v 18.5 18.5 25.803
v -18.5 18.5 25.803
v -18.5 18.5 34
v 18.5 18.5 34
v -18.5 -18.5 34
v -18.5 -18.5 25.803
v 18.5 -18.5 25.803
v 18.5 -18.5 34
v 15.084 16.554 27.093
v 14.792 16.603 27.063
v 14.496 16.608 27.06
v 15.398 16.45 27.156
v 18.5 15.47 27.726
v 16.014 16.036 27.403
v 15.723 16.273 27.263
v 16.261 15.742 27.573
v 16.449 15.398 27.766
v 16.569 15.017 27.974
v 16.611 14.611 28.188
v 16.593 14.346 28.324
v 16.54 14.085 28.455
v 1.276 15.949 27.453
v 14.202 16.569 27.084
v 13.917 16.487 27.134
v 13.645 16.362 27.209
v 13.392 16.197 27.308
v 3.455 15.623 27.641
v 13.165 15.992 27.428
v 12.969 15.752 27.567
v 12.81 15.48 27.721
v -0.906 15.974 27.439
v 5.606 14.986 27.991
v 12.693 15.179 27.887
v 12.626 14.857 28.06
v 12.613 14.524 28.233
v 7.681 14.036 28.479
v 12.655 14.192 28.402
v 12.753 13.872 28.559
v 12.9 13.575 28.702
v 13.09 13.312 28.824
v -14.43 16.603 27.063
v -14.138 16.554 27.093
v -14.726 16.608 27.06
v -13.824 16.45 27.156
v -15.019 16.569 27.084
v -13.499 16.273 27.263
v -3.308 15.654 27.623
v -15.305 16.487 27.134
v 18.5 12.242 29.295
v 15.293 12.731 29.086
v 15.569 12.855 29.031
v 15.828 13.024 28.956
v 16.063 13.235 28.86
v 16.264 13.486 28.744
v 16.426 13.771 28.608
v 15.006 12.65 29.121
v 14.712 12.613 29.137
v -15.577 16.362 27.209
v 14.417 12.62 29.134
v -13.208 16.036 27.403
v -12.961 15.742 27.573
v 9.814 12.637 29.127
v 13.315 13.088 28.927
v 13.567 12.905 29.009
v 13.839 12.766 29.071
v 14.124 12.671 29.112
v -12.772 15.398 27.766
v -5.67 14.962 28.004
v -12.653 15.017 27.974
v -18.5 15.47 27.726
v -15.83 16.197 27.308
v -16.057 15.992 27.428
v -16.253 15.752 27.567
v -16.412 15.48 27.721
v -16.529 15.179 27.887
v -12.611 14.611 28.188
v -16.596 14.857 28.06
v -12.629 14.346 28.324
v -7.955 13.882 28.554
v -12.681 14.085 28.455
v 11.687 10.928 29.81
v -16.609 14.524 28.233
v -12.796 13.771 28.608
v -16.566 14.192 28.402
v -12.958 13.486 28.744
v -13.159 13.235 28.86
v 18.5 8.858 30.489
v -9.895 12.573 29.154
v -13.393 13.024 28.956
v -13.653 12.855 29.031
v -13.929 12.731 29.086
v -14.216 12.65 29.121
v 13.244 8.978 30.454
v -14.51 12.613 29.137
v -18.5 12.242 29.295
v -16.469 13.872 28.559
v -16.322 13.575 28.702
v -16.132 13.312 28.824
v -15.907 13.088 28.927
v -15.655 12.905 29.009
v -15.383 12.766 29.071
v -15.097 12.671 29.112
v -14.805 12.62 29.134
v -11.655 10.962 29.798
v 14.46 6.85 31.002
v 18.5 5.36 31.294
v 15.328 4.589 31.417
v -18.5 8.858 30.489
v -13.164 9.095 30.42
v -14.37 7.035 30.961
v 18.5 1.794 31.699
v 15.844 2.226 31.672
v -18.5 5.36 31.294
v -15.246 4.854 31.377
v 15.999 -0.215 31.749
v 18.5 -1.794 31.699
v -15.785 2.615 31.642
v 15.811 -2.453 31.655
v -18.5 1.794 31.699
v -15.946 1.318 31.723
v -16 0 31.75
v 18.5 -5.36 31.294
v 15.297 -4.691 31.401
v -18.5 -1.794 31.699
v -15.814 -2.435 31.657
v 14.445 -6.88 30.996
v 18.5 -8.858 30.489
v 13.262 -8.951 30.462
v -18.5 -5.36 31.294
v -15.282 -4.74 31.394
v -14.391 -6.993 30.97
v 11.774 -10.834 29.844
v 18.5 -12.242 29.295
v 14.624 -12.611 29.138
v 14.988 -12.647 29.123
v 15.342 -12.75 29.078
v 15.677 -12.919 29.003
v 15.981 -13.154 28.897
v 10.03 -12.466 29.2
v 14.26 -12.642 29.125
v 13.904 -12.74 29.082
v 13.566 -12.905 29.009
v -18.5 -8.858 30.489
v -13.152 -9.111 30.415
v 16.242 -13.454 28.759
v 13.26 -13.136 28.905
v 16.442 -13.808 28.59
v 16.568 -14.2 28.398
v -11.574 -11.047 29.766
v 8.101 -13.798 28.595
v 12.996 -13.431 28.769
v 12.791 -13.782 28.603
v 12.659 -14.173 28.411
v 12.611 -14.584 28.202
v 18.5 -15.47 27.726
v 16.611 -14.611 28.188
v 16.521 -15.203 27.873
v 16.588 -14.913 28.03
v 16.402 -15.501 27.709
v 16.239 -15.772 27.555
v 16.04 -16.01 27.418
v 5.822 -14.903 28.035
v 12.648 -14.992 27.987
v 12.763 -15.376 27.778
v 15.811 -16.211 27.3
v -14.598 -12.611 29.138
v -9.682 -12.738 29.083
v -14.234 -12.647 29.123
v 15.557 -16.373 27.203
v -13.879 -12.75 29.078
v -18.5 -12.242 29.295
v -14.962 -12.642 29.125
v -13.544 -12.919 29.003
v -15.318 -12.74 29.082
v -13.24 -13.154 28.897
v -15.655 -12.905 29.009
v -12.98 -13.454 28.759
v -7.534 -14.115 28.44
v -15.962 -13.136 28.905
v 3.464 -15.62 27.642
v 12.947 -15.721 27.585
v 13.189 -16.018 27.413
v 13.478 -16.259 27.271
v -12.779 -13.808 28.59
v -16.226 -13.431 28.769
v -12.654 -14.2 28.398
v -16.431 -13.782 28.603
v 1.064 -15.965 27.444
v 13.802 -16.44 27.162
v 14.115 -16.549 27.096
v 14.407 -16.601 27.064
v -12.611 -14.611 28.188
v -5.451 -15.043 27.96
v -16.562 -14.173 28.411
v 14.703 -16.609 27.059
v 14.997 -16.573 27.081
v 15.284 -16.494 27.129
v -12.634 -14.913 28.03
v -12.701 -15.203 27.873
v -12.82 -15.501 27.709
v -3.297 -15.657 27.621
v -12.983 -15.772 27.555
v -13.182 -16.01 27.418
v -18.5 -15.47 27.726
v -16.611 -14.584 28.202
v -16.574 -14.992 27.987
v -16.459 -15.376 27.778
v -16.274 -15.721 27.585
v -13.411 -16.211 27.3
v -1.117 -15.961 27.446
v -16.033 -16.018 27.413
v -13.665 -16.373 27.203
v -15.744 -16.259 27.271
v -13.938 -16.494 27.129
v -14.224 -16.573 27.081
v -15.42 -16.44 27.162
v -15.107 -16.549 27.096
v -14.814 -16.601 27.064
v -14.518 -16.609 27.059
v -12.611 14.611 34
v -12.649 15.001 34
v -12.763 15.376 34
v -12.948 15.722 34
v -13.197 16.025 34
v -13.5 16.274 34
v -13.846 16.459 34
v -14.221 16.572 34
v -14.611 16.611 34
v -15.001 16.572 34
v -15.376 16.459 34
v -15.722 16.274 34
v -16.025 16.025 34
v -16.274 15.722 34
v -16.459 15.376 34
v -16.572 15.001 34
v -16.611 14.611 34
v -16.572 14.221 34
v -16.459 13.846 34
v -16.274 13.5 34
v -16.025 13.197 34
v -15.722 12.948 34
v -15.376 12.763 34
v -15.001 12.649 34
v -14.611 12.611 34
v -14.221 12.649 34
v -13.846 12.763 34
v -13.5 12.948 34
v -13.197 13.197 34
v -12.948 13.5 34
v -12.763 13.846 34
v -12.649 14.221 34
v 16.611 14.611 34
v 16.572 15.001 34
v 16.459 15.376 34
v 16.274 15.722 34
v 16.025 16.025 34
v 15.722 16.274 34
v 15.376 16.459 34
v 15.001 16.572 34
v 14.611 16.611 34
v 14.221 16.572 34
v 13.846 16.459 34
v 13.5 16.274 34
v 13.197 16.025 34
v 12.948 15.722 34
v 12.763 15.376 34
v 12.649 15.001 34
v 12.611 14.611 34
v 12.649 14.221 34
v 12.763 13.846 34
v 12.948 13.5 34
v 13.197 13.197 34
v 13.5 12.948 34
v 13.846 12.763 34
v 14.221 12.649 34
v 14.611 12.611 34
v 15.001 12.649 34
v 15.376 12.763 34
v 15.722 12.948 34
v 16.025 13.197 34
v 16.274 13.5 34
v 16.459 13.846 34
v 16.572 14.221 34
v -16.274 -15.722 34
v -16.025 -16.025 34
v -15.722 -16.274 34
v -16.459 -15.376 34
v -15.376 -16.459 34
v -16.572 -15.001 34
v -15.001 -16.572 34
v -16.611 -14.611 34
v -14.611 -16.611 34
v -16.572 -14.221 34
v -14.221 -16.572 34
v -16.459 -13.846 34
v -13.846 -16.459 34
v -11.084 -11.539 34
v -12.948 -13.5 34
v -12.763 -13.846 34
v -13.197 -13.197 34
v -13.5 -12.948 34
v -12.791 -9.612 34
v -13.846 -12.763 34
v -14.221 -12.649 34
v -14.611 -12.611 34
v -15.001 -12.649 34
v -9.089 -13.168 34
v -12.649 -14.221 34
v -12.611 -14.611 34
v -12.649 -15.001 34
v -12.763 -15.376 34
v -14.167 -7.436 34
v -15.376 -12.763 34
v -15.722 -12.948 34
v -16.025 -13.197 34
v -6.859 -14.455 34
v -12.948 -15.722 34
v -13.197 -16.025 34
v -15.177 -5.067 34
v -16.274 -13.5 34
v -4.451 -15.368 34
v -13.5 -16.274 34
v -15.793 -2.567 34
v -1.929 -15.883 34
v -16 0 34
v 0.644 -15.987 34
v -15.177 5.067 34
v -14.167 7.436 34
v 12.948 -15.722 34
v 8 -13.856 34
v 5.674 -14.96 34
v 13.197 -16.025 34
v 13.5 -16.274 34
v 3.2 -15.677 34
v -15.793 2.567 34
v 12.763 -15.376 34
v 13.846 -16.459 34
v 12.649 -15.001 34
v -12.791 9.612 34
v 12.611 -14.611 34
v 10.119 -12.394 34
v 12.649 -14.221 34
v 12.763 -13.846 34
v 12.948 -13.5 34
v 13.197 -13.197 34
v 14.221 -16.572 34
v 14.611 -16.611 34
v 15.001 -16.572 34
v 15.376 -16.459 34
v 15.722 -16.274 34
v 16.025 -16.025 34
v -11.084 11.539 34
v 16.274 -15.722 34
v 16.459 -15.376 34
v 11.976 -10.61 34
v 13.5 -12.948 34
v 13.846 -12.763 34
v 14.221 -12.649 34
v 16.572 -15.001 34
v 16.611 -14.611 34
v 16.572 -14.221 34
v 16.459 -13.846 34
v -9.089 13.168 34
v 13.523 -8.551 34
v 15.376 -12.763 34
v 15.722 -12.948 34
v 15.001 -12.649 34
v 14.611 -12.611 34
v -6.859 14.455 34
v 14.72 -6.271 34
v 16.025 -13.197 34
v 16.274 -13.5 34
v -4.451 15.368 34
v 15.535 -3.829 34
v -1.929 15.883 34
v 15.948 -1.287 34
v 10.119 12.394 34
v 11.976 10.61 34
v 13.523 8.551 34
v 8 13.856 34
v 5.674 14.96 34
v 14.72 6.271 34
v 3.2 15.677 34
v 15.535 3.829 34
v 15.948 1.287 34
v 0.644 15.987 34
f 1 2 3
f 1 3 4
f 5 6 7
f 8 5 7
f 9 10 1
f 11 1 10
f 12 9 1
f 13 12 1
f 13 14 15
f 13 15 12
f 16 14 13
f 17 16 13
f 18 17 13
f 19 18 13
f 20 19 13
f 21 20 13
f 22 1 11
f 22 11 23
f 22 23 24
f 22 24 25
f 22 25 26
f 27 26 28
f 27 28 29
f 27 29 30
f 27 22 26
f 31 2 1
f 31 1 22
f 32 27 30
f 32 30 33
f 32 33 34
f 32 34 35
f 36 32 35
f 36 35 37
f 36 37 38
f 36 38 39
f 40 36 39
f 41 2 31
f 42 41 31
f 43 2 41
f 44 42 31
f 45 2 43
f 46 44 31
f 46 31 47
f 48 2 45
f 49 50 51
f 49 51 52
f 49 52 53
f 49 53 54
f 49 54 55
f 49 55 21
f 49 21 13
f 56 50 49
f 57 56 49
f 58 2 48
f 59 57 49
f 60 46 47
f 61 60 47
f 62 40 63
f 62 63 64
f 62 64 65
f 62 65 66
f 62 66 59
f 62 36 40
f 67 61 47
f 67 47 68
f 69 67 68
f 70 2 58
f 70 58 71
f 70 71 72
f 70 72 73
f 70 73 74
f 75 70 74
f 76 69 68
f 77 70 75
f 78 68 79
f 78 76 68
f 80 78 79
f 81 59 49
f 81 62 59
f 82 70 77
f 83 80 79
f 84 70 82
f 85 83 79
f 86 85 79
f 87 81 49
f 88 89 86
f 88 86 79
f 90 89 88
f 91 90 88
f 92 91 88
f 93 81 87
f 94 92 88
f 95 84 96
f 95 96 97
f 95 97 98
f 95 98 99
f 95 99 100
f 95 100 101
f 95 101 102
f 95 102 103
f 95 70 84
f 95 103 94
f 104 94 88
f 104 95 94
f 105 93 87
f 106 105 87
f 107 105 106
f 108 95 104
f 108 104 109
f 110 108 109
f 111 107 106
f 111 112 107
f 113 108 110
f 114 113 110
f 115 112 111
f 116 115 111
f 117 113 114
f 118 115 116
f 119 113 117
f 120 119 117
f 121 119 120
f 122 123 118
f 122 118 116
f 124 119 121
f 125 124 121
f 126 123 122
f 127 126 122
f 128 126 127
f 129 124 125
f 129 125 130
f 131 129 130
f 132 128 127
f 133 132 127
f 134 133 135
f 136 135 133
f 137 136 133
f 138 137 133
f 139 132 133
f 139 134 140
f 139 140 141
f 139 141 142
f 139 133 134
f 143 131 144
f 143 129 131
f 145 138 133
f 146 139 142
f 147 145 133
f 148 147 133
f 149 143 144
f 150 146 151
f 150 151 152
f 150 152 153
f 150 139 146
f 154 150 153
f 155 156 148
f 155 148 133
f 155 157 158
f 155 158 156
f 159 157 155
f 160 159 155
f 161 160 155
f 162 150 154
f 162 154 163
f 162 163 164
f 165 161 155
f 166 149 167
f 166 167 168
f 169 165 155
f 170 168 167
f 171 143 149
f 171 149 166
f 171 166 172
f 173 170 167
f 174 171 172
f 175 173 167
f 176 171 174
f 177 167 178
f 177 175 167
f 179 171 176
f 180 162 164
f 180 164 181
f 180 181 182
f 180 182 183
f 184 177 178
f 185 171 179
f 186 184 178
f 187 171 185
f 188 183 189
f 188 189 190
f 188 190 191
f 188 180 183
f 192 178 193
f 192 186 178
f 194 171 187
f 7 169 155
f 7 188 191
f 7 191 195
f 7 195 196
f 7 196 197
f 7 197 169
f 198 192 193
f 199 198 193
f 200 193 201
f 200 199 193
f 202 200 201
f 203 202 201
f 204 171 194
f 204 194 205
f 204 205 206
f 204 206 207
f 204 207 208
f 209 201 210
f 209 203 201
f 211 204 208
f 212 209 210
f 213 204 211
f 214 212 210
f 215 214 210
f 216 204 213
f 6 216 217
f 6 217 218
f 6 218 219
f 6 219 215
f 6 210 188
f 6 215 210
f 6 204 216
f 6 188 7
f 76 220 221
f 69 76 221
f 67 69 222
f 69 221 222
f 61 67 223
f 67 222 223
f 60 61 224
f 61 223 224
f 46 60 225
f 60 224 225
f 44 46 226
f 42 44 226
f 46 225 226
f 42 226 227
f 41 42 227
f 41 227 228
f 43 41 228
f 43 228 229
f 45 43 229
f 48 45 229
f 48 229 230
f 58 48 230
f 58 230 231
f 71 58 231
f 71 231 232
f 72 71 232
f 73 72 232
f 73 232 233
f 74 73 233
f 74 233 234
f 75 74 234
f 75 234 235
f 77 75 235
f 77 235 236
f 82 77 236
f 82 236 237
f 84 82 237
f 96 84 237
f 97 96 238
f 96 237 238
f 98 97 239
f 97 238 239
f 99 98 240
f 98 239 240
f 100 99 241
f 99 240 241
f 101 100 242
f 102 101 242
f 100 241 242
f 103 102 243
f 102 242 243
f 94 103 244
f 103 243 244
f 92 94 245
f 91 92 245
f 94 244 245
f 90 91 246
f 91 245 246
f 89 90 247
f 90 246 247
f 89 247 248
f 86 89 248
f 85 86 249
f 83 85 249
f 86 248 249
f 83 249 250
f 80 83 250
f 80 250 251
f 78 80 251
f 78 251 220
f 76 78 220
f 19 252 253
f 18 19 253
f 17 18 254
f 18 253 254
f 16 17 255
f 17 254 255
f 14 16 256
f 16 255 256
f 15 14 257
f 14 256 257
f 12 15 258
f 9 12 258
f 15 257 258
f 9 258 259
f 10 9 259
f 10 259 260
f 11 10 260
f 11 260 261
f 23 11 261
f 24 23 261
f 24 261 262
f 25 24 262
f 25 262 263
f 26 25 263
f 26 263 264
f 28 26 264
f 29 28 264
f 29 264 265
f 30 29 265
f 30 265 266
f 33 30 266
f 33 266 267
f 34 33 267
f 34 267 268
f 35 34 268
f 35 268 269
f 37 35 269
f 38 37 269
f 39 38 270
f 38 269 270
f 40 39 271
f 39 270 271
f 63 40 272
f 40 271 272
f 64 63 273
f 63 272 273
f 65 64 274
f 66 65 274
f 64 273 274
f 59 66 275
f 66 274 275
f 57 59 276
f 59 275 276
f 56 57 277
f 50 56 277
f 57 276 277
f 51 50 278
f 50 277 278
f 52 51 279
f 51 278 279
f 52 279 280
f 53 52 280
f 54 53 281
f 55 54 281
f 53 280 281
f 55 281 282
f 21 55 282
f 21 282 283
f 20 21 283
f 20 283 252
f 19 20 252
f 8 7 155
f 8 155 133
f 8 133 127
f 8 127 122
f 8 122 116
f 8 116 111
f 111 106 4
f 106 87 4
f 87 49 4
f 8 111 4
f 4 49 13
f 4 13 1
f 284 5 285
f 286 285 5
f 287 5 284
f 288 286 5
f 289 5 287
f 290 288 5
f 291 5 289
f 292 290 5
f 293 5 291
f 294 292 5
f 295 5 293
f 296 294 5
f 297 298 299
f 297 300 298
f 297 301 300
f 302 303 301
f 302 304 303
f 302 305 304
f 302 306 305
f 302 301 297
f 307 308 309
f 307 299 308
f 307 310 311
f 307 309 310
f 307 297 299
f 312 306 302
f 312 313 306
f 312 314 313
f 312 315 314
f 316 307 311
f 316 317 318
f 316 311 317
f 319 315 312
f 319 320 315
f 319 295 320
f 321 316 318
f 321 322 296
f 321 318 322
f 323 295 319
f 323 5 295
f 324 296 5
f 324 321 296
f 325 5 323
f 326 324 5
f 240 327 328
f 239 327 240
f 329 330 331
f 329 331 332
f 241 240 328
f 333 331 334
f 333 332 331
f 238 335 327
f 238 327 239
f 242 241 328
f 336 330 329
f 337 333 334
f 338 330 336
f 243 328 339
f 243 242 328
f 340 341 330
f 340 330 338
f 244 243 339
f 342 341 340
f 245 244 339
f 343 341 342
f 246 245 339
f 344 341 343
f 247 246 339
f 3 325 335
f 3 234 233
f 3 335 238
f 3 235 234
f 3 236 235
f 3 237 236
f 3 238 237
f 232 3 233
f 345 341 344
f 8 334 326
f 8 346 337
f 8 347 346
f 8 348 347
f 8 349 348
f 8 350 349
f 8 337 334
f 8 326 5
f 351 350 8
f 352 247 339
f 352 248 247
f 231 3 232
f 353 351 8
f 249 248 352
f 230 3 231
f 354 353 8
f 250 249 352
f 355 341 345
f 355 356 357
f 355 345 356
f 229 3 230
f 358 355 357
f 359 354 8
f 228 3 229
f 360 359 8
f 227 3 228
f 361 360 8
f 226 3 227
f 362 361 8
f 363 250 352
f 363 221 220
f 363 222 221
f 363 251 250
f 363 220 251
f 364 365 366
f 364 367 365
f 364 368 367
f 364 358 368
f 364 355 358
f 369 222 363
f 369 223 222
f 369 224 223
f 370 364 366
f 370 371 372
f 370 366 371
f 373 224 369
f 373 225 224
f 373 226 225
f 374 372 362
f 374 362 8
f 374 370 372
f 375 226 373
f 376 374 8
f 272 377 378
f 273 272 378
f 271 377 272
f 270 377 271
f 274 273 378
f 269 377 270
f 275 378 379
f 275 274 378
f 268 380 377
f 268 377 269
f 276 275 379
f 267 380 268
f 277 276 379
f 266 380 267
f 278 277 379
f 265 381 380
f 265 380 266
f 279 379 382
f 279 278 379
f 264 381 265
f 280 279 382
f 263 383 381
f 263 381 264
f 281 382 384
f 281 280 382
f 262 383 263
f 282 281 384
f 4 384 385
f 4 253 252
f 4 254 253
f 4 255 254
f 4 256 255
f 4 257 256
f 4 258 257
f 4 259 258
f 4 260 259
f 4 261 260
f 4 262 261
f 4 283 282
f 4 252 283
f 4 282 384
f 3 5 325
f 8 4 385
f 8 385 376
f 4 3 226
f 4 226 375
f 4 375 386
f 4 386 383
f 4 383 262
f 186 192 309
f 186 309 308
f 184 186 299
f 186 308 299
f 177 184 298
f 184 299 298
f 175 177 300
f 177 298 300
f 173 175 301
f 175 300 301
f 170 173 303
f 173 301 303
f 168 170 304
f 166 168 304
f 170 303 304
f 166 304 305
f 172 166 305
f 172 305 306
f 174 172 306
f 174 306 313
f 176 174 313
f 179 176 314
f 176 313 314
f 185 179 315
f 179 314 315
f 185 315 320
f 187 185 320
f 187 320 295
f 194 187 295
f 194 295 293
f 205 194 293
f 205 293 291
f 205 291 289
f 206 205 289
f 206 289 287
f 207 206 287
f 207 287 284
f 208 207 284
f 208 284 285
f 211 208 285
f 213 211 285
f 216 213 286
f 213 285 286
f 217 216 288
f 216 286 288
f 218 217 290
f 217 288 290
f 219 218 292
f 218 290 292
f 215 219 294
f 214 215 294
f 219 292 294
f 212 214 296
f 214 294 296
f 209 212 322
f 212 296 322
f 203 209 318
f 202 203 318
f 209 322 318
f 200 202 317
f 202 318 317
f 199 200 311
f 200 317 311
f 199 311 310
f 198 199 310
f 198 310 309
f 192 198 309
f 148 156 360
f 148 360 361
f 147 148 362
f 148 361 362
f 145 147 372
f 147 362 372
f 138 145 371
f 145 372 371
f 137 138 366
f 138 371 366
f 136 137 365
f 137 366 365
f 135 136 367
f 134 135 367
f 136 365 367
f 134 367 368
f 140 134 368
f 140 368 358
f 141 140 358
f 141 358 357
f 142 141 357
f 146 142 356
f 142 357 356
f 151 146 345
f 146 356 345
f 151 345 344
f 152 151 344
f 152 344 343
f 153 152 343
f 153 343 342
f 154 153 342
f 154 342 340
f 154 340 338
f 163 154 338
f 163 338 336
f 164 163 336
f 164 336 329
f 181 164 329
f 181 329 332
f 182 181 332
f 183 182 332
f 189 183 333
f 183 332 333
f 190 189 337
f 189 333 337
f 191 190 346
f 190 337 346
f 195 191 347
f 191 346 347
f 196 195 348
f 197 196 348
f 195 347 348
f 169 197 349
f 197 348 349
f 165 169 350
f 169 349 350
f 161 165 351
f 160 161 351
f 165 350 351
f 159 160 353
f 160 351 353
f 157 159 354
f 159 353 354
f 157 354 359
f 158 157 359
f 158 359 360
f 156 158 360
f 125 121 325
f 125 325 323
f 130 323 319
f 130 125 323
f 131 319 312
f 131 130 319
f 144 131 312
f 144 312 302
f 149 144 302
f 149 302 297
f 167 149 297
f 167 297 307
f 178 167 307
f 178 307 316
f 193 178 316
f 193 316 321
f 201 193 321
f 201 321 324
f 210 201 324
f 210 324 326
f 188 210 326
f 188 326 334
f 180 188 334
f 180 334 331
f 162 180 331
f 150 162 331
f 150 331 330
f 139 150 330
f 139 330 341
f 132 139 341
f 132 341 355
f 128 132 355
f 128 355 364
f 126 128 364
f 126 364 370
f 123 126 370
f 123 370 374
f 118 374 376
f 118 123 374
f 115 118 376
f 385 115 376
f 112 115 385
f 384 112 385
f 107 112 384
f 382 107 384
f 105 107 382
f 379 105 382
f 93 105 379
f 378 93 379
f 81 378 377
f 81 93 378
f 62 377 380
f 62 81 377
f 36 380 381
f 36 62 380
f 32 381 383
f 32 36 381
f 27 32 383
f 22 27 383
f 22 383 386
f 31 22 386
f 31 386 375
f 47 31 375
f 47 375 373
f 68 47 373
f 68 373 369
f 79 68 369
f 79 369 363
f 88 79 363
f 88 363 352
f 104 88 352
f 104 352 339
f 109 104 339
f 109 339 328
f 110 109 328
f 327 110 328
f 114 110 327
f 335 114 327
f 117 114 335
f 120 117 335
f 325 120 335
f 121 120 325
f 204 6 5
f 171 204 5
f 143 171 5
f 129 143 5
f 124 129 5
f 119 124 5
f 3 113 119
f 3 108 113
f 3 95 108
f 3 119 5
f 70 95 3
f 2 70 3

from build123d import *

# Parameters (mm, degrees)
SKETCH1_W               = 37
SKETCH1_H               = 37
BOSS_EXTRUDE1_DEPTH     = 34
CUT_EXTRUDE1_DEPTH      = 20
CUT_EXTRUDE1_DEPTH_BACK = 20
SKETCH2_R               = 31.75
SKETCH5_R               = 16
CUT_EXTRUDE2_DEPTH      = 43.901048938
SKETCH6_R               = 2
CUT_EXTRUDE3_DEPTH      = 28.41687798


with BuildPart() as part:
    # Sketch1 → Boss-Extrude1 (new body)
    with BuildSketch(Plane.XY):
        Rectangle(SKETCH1_W, SKETCH1_H)
    extrude(amount=BOSS_EXTRUDE1_DEPTH)

    # Sketch2 → Cut-Extrude1 (cut, two sides: drawn at the far end of the back side and taken through both)
    with BuildSketch(Plane(origin=(0, 0, 0), x_dir=(0, 0, -1), z_dir=(1, 0, 0)).offset(-CUT_EXTRUDE1_DEPTH_BACK)):
        Circle(SKETCH2_R)
    extrude(amount=CUT_EXTRUDE1_DEPTH + CUT_EXTRUDE1_DEPTH_BACK, mode=Mode.SUBTRACT)

    # Sketch5 → Cut-Extrude2 (cut, through all)
    with BuildSketch(Plane.XY):
        with Locations(Location((0, 0, 0), (0, 0, 180))):
            Circle(SKETCH5_R)
    extrude(amount=CUT_EXTRUDE2_DEPTH, mode=Mode.SUBTRACT)

    # Sketch6 → Cut-Extrude3 (cut, through all)
    with BuildSketch(Plane.XY.offset(34)):
        with Locations((-14.610912703, -14.610912703)):
            Circle(SKETCH6_R)
        with Locations((14.610912703, -14.610912703)):
            Circle(SKETCH6_R)
        with Locations((14.610912703, 14.610912703)):
            Circle(SKETCH6_R)
        with Locations((-14.610912703, 14.610912703)):
            Circle(SKETCH6_R)
    extrude(amount=-CUT_EXTRUDE3_DEPTH, mode=Mode.SUBTRACT)


solid = part.part
